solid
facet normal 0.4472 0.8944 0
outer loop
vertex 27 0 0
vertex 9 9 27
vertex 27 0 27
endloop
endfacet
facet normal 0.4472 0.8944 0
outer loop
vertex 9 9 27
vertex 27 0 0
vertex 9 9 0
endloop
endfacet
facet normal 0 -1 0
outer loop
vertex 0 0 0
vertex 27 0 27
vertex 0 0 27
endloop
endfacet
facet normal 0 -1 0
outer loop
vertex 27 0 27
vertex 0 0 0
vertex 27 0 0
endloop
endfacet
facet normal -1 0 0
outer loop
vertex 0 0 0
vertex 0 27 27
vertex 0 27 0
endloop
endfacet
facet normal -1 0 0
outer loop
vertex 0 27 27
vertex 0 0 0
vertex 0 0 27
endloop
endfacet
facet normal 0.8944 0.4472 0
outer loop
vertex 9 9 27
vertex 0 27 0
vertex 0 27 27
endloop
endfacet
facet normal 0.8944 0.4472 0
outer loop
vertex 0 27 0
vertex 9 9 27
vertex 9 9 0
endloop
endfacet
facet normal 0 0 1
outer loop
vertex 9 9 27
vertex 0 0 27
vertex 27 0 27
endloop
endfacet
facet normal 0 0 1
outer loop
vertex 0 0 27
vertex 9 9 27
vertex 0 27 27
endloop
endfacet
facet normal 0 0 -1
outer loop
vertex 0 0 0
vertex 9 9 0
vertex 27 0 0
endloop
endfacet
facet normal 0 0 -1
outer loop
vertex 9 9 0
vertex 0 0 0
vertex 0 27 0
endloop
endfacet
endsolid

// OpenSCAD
scale(3) {
    polyhedron(
        points=[
            [3,3,9],
            [0,9,9],
            [9,0,9],
            [0,0,9],
            [3,3,0],
            [0,9,0],
            [9,0,0],
            [0,0,0],
        ],
        faces=[
            [ 0, 4, 6, 2 ],
            [ 2, 6, 7, 3 ],
            [ 3, 7, 5, 1 ],
            [ 1, 5, 4, 0 ],
            [ 0, 2, 3, 1 ],
            [ 4, 5, 7, 6 ],
        ]);
}
